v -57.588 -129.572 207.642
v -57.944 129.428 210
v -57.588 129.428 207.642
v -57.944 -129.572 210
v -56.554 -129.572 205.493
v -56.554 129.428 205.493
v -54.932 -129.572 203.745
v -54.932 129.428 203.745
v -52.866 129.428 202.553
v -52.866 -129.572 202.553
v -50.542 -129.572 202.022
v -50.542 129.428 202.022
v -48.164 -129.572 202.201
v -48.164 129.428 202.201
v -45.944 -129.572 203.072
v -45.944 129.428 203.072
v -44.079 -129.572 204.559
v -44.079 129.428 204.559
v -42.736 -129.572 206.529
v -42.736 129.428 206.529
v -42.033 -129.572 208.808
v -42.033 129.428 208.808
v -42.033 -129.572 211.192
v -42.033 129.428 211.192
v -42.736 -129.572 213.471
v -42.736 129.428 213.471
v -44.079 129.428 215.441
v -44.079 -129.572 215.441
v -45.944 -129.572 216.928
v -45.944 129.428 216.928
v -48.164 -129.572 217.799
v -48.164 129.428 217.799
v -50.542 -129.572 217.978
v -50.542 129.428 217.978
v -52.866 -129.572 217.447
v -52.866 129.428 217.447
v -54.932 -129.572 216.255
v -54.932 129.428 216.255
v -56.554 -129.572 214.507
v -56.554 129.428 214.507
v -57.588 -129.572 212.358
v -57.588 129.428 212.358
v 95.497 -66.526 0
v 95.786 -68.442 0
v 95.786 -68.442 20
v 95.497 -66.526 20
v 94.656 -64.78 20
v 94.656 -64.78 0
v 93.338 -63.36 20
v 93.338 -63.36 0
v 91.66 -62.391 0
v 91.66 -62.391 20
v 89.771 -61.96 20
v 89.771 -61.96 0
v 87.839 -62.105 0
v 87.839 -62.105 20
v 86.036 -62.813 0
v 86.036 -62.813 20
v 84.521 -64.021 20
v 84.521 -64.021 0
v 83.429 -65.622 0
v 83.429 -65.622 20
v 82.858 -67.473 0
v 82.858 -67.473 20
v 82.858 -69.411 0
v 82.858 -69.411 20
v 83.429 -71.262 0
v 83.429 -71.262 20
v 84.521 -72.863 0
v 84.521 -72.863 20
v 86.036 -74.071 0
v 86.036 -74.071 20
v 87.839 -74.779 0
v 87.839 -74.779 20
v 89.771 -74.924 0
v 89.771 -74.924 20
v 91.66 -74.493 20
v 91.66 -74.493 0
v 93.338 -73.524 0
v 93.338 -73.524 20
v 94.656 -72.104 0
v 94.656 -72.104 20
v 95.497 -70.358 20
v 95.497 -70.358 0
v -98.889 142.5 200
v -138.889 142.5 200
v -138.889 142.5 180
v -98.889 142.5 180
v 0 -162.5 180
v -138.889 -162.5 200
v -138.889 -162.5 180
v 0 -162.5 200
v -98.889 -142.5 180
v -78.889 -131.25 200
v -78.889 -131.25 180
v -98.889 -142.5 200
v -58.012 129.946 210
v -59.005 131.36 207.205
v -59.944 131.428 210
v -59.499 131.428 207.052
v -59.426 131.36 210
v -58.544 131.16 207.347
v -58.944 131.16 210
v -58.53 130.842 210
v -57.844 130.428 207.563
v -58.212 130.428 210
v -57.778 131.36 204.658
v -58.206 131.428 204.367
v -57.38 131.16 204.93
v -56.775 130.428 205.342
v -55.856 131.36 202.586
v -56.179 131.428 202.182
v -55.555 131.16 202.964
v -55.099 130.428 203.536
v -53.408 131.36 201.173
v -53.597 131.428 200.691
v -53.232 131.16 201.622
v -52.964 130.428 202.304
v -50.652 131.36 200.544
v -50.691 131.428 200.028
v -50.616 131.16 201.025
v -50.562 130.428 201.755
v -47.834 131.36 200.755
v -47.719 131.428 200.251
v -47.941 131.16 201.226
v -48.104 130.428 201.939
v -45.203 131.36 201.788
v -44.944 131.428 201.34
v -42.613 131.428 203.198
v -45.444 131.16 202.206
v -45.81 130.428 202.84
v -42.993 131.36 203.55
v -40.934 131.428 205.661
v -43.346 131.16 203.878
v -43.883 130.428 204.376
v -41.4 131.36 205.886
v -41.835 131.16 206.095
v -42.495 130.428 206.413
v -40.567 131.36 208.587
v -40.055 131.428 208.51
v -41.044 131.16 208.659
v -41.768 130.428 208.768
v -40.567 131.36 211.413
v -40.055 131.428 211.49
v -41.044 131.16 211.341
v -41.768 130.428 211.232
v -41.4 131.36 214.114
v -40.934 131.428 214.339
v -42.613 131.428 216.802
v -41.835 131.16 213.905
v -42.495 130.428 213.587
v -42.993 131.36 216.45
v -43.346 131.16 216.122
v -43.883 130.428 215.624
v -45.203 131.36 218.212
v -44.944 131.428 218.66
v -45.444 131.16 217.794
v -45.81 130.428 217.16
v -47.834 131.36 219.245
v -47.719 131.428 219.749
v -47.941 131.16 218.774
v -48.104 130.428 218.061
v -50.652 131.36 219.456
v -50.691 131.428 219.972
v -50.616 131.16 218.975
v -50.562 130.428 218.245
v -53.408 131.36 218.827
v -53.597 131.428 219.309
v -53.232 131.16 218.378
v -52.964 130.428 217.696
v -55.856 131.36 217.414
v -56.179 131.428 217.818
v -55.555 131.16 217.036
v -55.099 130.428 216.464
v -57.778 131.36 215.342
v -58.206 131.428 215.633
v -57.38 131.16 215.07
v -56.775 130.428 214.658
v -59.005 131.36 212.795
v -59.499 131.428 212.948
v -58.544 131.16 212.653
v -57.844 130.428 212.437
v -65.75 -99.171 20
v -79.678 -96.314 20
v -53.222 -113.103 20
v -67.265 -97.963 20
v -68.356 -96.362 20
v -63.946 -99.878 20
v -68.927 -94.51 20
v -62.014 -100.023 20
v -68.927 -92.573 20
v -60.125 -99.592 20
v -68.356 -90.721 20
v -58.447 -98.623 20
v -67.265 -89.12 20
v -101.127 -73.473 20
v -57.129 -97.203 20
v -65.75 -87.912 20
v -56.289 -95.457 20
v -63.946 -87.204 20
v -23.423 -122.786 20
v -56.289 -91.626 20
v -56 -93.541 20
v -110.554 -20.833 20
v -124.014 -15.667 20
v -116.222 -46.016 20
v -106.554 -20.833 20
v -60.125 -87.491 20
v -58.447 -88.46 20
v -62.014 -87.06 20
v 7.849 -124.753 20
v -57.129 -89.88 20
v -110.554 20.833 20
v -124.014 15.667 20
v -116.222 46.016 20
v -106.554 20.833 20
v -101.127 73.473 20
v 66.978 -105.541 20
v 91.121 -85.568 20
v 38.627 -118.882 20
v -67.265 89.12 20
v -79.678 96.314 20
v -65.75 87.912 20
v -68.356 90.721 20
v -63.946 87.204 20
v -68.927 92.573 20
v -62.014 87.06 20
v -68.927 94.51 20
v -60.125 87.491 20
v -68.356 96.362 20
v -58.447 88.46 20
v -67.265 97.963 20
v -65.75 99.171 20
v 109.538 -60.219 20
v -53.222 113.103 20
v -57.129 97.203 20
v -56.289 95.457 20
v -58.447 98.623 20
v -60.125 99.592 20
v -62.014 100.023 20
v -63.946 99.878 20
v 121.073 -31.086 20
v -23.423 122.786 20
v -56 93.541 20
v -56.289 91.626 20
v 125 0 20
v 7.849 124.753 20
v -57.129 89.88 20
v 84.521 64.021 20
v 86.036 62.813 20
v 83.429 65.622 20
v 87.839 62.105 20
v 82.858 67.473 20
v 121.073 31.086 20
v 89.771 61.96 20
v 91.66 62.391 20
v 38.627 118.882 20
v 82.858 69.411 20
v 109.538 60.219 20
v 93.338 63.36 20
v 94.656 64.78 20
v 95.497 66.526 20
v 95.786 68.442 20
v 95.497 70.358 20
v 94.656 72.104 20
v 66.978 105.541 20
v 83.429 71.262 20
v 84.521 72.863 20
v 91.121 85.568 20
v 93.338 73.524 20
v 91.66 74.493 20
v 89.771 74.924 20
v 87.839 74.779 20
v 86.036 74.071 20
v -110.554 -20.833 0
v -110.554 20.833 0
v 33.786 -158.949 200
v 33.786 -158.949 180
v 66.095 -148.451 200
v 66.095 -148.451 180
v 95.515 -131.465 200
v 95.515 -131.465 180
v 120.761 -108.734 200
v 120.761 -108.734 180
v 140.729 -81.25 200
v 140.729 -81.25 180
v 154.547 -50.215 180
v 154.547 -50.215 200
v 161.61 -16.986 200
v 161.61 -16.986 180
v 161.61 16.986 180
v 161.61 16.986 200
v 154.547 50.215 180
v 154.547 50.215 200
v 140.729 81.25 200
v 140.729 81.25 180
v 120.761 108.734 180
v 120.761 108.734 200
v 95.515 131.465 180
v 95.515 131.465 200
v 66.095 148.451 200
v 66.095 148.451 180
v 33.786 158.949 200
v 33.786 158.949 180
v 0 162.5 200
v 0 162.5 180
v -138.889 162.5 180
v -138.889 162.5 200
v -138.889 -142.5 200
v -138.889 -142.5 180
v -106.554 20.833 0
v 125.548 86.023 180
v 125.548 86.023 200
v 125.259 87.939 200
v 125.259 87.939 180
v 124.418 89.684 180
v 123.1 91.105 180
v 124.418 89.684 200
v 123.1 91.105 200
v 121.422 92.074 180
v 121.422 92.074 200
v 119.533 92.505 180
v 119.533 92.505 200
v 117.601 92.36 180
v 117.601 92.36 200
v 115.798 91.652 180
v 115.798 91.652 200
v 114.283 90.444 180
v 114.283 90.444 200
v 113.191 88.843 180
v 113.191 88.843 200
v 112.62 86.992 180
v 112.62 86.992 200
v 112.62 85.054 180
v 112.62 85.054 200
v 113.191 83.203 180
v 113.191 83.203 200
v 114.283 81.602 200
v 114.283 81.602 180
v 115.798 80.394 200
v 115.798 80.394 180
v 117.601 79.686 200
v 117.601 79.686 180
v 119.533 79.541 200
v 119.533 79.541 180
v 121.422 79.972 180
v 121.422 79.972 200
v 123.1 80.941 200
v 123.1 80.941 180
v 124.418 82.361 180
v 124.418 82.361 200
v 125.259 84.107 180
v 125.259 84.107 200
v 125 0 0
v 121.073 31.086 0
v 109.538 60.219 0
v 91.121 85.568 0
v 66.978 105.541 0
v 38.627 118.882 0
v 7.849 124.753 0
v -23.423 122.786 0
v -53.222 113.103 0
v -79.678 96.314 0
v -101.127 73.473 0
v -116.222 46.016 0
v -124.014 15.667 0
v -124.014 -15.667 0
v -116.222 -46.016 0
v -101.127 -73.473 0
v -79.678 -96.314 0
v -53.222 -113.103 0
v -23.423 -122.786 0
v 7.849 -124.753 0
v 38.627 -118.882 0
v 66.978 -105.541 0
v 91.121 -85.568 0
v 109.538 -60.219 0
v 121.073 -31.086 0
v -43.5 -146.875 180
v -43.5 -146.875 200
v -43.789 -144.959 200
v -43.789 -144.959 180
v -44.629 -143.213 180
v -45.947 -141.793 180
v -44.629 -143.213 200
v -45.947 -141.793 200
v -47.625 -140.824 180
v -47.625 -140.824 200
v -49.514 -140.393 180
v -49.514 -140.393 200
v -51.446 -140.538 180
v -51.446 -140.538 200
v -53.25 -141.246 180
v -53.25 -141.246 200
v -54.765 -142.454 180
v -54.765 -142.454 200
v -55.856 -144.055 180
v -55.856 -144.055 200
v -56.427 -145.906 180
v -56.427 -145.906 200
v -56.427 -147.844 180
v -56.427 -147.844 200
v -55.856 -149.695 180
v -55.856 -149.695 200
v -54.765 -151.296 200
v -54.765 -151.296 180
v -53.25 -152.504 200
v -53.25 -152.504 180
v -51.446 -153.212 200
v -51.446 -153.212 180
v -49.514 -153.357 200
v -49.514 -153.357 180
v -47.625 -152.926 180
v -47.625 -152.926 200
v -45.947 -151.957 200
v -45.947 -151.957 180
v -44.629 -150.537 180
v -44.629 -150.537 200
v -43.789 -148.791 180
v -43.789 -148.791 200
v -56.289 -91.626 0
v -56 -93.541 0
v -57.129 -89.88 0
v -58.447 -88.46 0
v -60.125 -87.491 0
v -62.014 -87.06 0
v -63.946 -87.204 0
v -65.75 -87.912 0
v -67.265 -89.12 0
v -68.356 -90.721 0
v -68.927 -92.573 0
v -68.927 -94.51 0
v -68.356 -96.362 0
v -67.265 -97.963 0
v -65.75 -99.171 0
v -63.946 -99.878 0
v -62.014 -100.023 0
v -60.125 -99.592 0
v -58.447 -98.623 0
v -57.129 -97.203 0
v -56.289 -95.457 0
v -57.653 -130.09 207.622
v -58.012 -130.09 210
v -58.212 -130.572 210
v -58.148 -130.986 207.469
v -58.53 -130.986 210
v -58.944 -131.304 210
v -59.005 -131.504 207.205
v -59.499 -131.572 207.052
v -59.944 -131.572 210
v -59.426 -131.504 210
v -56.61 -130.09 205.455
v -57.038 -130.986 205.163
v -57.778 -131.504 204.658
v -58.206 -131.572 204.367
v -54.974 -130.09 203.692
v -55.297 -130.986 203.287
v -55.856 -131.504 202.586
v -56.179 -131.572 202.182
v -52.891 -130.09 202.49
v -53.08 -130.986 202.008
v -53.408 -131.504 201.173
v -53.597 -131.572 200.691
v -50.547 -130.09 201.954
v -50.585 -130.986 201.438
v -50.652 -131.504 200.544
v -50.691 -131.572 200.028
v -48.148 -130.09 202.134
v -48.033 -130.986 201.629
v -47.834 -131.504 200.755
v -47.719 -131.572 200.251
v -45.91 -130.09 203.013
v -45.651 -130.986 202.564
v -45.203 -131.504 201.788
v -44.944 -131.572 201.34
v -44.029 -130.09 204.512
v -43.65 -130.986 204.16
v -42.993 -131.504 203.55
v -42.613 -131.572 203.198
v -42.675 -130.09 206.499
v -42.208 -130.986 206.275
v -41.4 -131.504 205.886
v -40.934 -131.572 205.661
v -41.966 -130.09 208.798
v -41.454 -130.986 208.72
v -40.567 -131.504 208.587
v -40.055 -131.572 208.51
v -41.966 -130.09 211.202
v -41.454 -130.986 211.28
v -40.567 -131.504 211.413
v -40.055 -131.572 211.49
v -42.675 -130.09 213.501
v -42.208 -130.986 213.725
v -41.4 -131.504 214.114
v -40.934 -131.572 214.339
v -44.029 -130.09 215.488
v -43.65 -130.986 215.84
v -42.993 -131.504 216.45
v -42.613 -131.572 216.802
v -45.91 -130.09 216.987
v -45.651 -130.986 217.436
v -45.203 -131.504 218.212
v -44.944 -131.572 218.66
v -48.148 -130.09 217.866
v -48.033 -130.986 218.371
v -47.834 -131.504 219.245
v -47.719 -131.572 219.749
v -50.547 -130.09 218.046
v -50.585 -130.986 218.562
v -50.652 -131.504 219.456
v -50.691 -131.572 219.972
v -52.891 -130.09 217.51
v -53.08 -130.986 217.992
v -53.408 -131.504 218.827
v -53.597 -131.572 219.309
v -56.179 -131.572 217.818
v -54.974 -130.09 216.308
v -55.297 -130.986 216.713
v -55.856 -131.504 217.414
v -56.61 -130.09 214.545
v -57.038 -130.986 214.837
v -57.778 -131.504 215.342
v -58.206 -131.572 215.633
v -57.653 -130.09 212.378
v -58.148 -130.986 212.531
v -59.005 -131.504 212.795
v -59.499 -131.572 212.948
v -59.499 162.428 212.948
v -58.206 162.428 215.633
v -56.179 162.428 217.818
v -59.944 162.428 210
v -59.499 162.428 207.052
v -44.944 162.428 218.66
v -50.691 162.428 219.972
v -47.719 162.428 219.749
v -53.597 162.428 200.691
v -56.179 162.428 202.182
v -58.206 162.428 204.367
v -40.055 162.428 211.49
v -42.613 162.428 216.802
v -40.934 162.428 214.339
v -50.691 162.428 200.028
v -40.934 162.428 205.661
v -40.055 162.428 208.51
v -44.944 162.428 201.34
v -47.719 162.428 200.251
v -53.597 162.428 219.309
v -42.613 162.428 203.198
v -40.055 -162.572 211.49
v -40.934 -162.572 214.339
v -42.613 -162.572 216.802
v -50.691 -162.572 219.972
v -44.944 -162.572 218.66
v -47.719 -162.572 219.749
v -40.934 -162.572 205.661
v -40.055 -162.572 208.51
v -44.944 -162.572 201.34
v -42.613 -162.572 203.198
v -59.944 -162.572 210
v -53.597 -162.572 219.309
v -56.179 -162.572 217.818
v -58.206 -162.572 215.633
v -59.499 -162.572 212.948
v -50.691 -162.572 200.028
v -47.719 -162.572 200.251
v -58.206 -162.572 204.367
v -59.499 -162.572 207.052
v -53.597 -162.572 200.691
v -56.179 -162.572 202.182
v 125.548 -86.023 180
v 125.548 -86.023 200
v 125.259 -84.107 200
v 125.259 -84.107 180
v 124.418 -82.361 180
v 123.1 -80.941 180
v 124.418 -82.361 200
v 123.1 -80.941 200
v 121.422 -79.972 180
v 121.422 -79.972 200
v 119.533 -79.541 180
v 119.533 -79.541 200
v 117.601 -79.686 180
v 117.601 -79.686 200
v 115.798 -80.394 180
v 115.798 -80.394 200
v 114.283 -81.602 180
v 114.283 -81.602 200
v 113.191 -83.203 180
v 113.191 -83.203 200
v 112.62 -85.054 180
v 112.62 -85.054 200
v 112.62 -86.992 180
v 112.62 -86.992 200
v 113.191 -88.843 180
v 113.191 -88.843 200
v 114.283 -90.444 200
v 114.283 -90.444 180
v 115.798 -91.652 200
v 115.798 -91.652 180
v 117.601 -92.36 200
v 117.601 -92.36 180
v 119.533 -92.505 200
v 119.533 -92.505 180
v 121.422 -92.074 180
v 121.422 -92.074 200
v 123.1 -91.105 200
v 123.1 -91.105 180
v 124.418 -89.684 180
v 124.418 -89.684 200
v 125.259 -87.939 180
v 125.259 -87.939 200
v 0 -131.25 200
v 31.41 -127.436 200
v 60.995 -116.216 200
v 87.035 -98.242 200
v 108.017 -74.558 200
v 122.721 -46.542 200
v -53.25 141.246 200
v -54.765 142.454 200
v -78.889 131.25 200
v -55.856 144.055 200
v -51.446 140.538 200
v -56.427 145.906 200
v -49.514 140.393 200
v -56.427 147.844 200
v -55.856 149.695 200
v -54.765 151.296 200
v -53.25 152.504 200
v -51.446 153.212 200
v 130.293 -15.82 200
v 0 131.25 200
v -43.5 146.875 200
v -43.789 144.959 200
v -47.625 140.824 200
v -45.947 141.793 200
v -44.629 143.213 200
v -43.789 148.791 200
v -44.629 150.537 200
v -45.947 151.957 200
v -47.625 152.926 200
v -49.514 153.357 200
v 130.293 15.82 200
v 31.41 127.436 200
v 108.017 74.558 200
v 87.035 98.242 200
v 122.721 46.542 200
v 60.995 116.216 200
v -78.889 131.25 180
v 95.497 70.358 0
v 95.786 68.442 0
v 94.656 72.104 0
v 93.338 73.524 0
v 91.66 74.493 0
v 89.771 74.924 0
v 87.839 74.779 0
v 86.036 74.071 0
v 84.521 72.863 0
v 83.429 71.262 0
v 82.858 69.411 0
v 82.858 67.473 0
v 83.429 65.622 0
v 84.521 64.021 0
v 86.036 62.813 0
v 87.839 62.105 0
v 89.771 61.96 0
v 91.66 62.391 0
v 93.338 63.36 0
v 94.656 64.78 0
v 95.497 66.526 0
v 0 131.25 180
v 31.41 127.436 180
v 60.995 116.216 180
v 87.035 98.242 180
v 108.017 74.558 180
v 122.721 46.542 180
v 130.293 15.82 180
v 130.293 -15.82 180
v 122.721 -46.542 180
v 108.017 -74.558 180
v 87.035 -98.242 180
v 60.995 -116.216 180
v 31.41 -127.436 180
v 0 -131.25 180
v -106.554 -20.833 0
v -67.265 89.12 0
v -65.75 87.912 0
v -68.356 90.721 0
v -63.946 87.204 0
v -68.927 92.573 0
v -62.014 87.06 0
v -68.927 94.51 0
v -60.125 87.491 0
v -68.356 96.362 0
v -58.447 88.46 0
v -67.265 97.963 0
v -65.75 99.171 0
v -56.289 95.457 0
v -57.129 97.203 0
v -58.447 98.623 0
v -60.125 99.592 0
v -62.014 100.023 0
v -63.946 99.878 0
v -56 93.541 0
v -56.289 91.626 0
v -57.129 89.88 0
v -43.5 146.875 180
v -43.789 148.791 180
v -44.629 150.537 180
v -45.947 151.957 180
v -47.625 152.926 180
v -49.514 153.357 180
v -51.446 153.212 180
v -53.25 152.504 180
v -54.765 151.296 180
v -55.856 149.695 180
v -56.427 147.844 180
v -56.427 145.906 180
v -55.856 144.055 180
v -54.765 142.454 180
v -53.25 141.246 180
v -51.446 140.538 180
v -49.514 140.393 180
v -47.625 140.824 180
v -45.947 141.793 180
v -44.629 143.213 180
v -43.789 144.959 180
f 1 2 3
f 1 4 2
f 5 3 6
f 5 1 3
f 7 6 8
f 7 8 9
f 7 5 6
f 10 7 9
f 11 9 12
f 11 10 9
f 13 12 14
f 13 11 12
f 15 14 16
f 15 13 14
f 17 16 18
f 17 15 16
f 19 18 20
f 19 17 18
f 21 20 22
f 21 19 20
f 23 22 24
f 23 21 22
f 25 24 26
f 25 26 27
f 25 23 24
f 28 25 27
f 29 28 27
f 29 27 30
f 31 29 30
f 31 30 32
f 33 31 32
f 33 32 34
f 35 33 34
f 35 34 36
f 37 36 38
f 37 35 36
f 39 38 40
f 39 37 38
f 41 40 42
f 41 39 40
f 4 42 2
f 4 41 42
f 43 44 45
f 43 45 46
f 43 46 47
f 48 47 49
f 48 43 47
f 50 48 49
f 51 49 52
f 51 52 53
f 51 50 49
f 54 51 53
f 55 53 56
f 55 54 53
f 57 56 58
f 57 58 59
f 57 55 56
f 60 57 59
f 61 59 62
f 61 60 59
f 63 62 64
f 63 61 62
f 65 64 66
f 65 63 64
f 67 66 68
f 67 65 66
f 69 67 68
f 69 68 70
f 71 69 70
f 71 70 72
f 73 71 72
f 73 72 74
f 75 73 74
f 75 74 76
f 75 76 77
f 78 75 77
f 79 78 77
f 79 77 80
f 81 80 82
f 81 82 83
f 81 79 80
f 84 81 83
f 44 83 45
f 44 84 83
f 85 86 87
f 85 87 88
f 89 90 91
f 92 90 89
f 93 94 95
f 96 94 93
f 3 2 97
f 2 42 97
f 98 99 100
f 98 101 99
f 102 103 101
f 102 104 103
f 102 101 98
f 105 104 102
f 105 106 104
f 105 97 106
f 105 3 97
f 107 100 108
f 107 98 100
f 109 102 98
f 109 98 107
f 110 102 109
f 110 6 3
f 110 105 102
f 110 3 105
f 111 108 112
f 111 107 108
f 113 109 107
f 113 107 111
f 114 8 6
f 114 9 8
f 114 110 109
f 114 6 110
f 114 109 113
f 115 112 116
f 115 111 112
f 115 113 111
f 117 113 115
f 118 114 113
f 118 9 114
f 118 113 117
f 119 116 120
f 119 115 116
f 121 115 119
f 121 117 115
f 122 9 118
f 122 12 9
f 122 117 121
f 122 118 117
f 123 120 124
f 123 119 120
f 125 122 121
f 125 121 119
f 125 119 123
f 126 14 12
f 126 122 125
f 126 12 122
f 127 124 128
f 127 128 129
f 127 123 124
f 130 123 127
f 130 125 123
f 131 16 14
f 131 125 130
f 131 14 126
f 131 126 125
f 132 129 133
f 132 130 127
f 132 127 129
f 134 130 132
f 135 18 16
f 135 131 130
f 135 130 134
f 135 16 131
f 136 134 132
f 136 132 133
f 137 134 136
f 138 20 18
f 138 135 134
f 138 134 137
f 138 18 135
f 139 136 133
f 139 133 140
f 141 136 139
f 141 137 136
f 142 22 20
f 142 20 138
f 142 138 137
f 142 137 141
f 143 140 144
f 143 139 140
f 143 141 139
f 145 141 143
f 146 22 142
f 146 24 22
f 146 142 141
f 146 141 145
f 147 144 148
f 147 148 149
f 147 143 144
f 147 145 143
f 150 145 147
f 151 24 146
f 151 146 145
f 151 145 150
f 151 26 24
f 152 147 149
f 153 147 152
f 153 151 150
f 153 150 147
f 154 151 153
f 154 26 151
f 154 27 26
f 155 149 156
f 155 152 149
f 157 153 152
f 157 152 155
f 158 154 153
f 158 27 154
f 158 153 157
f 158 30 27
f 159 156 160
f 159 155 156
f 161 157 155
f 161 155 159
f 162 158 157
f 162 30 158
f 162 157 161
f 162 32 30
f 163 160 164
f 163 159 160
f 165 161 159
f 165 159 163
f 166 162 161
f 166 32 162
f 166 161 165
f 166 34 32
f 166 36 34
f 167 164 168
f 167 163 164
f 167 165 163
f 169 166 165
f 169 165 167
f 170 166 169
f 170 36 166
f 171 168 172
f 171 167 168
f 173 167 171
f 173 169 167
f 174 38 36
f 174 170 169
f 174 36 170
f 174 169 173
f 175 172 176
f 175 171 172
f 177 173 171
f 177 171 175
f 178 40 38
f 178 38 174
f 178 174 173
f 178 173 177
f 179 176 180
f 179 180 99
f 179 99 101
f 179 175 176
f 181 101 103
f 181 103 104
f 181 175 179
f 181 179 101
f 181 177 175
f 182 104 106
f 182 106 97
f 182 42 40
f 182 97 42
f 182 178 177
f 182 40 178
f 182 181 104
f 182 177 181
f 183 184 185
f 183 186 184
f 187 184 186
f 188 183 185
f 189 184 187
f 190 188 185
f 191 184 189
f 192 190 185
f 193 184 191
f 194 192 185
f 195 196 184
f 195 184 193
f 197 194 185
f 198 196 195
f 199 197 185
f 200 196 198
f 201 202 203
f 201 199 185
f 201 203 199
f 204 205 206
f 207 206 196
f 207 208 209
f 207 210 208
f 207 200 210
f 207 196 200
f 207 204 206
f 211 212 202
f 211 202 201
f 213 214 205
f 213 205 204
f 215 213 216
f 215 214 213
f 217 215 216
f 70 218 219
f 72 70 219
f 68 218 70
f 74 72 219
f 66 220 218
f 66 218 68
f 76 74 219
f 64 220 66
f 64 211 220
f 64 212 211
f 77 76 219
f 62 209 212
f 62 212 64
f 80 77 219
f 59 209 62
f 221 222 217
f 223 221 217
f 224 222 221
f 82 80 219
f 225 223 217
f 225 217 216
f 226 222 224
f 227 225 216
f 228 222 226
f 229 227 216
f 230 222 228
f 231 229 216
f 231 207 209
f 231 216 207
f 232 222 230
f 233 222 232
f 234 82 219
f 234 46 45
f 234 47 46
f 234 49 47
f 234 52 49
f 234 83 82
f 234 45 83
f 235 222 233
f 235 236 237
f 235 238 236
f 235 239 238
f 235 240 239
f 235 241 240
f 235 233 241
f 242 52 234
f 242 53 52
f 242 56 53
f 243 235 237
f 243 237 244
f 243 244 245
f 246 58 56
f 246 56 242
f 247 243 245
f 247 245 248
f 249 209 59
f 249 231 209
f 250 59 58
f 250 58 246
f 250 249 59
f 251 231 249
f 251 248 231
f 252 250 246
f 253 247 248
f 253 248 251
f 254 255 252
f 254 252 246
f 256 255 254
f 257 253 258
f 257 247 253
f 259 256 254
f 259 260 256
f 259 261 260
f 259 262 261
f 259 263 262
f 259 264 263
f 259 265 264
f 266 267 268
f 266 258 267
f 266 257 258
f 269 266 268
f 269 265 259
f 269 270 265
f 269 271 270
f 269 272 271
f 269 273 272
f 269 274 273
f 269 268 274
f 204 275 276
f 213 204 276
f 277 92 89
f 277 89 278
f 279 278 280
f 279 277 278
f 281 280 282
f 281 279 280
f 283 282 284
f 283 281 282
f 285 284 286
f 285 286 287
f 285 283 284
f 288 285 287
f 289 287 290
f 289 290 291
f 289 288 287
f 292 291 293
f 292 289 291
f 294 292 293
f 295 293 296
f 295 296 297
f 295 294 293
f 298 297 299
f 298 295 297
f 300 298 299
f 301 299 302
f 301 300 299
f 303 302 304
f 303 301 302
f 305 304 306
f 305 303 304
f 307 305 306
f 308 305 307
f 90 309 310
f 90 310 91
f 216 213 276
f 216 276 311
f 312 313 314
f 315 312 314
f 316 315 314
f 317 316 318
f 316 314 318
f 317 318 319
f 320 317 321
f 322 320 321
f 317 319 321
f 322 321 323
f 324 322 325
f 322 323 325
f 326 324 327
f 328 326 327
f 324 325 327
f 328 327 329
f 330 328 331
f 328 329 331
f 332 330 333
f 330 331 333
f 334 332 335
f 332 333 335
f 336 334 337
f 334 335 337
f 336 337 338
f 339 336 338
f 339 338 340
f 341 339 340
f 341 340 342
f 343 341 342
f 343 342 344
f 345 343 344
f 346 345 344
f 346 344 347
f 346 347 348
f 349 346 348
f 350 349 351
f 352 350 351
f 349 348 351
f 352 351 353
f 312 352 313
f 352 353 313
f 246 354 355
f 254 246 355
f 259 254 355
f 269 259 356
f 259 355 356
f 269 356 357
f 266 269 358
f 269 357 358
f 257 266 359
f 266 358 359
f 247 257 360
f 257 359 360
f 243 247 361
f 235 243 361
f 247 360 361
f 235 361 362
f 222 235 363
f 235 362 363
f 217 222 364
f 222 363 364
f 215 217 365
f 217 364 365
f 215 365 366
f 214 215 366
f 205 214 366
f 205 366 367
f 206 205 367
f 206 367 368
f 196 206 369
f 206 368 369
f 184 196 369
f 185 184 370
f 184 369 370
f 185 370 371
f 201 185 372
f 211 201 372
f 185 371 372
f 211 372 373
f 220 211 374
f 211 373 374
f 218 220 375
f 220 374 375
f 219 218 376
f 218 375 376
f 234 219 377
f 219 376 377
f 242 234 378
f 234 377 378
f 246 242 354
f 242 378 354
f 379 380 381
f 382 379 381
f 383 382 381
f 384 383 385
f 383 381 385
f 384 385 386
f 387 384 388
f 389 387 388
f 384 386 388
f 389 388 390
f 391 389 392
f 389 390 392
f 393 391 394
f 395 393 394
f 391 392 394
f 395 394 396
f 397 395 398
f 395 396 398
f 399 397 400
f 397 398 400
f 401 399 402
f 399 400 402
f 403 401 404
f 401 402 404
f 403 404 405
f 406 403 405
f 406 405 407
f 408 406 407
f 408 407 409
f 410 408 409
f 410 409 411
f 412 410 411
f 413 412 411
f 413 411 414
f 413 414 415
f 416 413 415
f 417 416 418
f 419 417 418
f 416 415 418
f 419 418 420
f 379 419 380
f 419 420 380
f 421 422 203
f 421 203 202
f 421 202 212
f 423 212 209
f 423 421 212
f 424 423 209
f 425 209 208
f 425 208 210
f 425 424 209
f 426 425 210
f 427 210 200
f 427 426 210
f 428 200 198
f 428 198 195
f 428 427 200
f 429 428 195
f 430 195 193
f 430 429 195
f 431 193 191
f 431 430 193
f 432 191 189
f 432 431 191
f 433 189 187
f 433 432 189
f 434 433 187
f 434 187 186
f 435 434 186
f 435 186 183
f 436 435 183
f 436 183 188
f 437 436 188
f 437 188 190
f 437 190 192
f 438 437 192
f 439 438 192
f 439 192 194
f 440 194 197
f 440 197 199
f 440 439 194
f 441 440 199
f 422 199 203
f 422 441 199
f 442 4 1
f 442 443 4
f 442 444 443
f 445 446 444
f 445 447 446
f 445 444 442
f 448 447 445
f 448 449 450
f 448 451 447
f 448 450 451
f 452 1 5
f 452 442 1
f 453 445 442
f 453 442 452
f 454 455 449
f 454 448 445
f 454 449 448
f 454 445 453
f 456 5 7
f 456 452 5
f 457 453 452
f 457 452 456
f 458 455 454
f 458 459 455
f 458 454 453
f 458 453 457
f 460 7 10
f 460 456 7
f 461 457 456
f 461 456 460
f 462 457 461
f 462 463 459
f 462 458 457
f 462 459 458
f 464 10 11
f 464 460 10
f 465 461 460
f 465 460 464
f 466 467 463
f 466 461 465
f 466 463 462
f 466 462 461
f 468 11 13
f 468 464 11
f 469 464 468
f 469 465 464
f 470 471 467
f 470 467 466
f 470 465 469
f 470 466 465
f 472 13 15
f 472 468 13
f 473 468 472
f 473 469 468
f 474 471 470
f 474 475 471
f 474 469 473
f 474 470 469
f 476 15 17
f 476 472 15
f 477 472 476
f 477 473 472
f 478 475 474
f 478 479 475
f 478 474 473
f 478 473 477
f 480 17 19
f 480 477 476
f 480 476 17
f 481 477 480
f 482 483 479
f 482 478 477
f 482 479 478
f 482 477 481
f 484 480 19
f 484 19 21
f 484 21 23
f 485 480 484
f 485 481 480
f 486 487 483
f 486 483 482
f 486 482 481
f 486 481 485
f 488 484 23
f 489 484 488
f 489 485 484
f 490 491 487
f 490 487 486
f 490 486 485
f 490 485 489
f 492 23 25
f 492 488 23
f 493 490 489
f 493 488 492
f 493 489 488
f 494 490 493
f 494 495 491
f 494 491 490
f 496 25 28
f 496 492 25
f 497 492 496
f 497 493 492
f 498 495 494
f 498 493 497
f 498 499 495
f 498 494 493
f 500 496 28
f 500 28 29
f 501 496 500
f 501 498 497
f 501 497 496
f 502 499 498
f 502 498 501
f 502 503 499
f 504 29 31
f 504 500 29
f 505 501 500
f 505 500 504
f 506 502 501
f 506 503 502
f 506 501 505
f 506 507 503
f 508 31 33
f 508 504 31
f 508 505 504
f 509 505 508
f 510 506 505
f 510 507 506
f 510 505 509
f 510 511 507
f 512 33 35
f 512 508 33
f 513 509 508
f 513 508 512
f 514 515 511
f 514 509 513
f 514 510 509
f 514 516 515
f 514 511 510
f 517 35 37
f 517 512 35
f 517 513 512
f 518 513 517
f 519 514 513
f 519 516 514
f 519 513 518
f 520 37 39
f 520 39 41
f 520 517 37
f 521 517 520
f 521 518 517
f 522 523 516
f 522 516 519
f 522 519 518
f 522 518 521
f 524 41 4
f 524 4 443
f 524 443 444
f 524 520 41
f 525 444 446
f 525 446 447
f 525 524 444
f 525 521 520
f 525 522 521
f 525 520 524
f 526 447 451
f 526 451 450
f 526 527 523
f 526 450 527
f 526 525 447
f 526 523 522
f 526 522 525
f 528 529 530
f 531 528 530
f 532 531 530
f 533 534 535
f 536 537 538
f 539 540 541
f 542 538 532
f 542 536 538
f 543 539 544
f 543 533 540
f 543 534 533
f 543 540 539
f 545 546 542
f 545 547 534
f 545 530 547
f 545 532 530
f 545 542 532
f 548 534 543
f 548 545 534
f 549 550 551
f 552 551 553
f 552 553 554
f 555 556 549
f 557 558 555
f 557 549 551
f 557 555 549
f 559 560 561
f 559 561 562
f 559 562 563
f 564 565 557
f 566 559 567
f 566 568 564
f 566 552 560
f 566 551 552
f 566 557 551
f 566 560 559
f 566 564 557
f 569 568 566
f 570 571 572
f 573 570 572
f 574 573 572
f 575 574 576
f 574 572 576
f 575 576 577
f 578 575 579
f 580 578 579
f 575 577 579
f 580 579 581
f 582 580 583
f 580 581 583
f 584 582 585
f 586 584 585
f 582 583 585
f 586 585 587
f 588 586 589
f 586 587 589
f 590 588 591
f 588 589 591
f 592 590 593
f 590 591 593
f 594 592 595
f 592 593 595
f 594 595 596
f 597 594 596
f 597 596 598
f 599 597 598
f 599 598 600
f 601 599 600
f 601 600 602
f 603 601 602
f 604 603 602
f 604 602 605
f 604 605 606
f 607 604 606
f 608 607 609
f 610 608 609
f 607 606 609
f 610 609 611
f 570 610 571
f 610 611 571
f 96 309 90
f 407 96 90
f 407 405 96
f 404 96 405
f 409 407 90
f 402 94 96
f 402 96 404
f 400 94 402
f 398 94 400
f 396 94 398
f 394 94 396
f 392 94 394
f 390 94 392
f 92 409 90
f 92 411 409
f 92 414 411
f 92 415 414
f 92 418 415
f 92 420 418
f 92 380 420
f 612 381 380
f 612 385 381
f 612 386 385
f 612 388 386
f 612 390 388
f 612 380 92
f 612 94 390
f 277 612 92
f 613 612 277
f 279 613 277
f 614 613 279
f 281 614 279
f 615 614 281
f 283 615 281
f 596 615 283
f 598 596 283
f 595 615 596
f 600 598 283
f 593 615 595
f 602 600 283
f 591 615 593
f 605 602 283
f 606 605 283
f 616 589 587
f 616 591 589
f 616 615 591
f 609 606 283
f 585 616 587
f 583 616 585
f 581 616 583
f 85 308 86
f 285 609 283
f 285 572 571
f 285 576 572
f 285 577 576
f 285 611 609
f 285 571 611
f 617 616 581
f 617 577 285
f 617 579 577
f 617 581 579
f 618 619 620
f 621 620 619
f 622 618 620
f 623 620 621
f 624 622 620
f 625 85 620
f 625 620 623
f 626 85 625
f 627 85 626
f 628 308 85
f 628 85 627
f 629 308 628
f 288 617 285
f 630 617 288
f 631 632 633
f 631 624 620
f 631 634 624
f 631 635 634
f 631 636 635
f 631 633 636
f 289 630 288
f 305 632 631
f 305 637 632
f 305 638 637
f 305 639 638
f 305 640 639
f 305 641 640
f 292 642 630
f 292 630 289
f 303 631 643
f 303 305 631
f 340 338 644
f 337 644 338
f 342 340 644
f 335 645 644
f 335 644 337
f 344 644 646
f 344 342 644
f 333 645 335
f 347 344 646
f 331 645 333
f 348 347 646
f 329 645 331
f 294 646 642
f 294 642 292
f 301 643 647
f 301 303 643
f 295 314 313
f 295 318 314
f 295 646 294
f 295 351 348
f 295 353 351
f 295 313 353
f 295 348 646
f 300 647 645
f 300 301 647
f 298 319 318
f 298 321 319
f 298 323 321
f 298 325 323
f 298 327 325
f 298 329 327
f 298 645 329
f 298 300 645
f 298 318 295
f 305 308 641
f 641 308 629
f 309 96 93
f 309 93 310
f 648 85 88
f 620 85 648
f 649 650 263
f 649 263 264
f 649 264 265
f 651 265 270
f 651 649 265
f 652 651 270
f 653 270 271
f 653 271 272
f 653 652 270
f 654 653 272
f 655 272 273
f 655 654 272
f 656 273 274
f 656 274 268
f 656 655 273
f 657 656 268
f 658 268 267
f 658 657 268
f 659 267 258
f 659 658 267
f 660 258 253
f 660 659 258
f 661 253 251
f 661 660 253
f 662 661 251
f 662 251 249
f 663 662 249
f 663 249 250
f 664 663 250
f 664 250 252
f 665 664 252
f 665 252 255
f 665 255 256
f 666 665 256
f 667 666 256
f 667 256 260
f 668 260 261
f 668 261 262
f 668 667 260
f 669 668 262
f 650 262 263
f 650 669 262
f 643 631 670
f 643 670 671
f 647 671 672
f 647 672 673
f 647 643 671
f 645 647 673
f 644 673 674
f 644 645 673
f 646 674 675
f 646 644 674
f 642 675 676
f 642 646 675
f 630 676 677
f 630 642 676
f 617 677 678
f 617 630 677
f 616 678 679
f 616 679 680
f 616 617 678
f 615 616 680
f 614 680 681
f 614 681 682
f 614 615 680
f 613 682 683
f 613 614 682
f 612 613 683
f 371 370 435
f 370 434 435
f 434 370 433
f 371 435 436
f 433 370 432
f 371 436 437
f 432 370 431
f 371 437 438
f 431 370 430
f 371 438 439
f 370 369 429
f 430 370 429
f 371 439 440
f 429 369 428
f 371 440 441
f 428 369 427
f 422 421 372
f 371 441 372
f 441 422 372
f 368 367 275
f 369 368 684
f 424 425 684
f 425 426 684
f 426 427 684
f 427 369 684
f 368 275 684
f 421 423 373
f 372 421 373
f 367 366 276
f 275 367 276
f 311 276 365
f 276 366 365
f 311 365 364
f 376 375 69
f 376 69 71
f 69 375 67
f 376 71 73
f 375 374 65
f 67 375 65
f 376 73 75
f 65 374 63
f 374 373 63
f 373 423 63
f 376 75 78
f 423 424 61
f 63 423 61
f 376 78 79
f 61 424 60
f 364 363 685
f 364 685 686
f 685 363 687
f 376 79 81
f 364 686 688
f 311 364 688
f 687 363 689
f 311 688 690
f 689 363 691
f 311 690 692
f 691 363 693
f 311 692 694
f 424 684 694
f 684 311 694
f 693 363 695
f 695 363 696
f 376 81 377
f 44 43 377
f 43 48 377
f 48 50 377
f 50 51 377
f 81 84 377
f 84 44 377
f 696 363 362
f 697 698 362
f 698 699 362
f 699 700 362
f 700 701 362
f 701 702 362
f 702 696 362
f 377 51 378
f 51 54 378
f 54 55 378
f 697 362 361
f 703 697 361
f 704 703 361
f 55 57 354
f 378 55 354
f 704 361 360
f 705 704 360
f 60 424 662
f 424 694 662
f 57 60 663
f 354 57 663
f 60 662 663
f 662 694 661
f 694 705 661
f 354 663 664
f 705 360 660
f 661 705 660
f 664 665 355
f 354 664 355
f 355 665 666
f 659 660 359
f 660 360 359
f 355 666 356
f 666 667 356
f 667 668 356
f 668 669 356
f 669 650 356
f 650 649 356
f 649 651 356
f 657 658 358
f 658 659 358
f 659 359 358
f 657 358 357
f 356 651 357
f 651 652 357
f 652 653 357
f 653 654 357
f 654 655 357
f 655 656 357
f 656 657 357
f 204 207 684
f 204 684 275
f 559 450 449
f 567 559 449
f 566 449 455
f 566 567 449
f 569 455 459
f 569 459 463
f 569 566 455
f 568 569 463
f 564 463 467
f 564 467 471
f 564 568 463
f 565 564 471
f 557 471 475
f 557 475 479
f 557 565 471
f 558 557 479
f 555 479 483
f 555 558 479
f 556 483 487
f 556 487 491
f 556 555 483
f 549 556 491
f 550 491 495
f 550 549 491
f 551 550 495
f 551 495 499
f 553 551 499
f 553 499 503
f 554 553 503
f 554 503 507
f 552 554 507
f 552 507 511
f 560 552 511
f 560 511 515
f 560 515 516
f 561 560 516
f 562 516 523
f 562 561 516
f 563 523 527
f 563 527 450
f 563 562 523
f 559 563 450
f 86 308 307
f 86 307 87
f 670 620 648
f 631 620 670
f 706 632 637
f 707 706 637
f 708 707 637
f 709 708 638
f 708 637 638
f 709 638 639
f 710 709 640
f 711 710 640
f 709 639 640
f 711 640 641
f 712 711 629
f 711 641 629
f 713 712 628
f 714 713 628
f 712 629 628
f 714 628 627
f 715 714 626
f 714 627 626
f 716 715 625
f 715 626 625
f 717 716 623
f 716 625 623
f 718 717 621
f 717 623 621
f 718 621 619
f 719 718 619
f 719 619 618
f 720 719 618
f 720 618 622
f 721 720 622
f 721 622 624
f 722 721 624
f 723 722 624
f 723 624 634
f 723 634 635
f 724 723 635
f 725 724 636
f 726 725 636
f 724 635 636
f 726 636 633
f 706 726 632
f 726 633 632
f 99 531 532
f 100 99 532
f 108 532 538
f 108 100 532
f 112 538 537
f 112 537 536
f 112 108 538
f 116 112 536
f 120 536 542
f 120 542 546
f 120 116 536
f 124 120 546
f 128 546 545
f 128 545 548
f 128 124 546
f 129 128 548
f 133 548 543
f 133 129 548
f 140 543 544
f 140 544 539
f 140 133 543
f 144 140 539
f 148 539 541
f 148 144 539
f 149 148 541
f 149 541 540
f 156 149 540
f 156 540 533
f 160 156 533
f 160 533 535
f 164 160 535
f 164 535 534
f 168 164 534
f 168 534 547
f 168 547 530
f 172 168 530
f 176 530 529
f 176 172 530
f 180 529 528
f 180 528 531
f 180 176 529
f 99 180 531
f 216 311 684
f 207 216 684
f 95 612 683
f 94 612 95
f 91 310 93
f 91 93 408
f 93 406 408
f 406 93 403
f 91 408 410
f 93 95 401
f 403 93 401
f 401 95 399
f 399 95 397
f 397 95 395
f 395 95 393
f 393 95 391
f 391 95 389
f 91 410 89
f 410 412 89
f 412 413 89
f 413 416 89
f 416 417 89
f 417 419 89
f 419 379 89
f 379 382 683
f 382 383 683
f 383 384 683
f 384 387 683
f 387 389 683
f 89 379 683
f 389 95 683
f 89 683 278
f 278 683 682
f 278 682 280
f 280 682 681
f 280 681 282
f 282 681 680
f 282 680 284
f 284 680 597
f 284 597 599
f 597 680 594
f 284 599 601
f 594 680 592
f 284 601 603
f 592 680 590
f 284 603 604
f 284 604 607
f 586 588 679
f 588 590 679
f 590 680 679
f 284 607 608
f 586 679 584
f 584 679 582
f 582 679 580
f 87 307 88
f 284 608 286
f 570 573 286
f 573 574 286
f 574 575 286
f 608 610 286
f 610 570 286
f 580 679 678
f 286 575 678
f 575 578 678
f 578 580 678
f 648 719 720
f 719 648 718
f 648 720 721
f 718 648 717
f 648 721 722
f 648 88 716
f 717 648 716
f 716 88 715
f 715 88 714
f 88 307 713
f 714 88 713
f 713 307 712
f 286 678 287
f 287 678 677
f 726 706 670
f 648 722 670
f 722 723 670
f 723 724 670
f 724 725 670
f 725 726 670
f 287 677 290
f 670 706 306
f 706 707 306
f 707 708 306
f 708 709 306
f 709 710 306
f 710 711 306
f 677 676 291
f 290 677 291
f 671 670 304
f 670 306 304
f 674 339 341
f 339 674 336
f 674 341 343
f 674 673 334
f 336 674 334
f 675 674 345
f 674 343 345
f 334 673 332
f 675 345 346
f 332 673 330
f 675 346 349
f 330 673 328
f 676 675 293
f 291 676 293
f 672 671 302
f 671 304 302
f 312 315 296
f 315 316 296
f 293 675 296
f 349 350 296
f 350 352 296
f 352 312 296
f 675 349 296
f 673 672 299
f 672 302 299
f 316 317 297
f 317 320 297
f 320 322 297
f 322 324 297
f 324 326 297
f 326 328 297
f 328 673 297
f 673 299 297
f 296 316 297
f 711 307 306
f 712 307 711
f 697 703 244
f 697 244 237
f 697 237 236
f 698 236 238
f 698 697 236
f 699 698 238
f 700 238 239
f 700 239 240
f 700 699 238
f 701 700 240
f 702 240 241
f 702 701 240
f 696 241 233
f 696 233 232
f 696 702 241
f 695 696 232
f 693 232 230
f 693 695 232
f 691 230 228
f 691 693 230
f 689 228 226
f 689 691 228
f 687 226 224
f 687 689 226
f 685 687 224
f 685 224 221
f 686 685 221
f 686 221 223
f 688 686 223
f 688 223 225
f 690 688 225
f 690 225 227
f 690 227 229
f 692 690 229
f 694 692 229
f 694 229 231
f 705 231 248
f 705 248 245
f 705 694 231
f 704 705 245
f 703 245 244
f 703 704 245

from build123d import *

# Parameters (mm, degrees)
F0_R     = 125
F0_R_2   = 6.5
F1_DEPTH = 20
F3_R     = 6.5
F4_DEPTH = 20


with BuildPart() as f1:
    # F0 (on Top) → F1 (new body)
    with BuildSketch(Plane.XY):
        Circle(F0_R)
        with Locations((-62.5, -93.5414346693)):
            Circle(F0_R_2, mode=Mode.SUBTRACT)
        Polygon((-110.5541596785, 20.8333333333), (-106.5541596785, 20.8333333333), (-106.5541596785, 0), (-106.5541596785, -20.8333333333), (-110.5541596785, -20.8333333333), (-110.5541596785, 0), align=None, mode=Mode.SUBTRACT)
        with Locations((89.2857142857, -68.4420282026)):
            Circle(F0_R_2, mode=Mode.SUBTRACT)
        with Locations((-62.5, 93.5414346693)):
            Circle(F0_R_2, mode=Mode.SUBTRACT)
        with Locations((89.2857142857, 68.4420282026)):
            Circle(F0_R_2, mode=Mode.SUBTRACT)
    extrude(amount=F1_DEPTH)


with BuildPart() as f4:
    # F3 (on offset) → F4 (new body)
    with BuildSketch(Plane.XY.offset(200)):
        with BuildLine():
            ThreePointArc((0, 131.25), (131.25, 0), (0, -131.25))
            Line((0, -131.25), (-78.8888888889, -131.25))
            Line((-78.8888888889, -131.25), (-98.8888888889, -142.5))
            Line((-98.8888888889, -142.5), (-138.8888888889, -142.5))
            Line((-138.8888888889, -142.5), (-138.8888888889, -162.5))
            Line((-138.8888888889, -162.5), (0, -162.5))
            ThreePointArc((0, -162.5), (162.5, 0), (0, 162.5))
            Line((0, 162.5), (-138.8888888889, 162.5))
            Line((-138.8888888889, 162.5), (-138.8888888889, 142.5))
            Line((-138.8888888889, 142.5), (-98.8888888889, 142.5))
            Line((-98.8888888889, 142.5), (-78.8888888889, 131.25))
            Line((-78.8888888889, 131.25), (0, 131.25))
        make_face()
        with Locations((-50, -146.875)):
            Circle(F3_R, mode=Mode.SUBTRACT)
        with Locations((119.0476190476, -86.0228459428)):
            Circle(F3_R, mode=Mode.SUBTRACT)
        with Locations((-50, 146.875)):
            Circle(F3_R, mode=Mode.SUBTRACT)
        with Locations((119.0476190476, 86.0228459428)):
            Circle(F3_R, mode=Mode.SUBTRACT)
    extrude(amount=-F4_DEPTH)


with BuildPart() as f7:
    # F6 (on offset) → F7 (revolve)
    with BuildSketch(Plane.XY.offset(210)):
        with BuildLine():
            Line((-59.9437263161, -162.5718830858), (-49.9437263161, -162.5718830858))
            Line((-49.9437263161, -162.5718830858), (-49.9437263161, 162.4281169142))
            Line((-49.9437263161, 162.4281169142), (-59.9437263161, 162.4281169142))
            Line((-59.9437263161, 162.4281169142), (-59.9437263161, 131.4281169142))
            ThreePointArc((-59.9437263161, 131.4281169142), (-58.5295127537, 130.8423304766), (-57.9437263161, 129.4281169142))
            Line((-57.9437263161, 129.4281169142), (-57.9437263161, -129.5718830858))
            ThreePointArc((-57.9437263161, -129.5718830858), (-58.5295127537, -130.9860966482), (-59.9437263161, -131.5718830858))
            Line((-59.9437263161, -131.5718830858), (-59.9437263161, -162.5718830858))
        make_face()
    revolve(axis=Axis((-49.9437263161, -0.0718830858, 210), (0, -1, 0)))


solid = Compound([f1.part, f4.part, f7.part])
